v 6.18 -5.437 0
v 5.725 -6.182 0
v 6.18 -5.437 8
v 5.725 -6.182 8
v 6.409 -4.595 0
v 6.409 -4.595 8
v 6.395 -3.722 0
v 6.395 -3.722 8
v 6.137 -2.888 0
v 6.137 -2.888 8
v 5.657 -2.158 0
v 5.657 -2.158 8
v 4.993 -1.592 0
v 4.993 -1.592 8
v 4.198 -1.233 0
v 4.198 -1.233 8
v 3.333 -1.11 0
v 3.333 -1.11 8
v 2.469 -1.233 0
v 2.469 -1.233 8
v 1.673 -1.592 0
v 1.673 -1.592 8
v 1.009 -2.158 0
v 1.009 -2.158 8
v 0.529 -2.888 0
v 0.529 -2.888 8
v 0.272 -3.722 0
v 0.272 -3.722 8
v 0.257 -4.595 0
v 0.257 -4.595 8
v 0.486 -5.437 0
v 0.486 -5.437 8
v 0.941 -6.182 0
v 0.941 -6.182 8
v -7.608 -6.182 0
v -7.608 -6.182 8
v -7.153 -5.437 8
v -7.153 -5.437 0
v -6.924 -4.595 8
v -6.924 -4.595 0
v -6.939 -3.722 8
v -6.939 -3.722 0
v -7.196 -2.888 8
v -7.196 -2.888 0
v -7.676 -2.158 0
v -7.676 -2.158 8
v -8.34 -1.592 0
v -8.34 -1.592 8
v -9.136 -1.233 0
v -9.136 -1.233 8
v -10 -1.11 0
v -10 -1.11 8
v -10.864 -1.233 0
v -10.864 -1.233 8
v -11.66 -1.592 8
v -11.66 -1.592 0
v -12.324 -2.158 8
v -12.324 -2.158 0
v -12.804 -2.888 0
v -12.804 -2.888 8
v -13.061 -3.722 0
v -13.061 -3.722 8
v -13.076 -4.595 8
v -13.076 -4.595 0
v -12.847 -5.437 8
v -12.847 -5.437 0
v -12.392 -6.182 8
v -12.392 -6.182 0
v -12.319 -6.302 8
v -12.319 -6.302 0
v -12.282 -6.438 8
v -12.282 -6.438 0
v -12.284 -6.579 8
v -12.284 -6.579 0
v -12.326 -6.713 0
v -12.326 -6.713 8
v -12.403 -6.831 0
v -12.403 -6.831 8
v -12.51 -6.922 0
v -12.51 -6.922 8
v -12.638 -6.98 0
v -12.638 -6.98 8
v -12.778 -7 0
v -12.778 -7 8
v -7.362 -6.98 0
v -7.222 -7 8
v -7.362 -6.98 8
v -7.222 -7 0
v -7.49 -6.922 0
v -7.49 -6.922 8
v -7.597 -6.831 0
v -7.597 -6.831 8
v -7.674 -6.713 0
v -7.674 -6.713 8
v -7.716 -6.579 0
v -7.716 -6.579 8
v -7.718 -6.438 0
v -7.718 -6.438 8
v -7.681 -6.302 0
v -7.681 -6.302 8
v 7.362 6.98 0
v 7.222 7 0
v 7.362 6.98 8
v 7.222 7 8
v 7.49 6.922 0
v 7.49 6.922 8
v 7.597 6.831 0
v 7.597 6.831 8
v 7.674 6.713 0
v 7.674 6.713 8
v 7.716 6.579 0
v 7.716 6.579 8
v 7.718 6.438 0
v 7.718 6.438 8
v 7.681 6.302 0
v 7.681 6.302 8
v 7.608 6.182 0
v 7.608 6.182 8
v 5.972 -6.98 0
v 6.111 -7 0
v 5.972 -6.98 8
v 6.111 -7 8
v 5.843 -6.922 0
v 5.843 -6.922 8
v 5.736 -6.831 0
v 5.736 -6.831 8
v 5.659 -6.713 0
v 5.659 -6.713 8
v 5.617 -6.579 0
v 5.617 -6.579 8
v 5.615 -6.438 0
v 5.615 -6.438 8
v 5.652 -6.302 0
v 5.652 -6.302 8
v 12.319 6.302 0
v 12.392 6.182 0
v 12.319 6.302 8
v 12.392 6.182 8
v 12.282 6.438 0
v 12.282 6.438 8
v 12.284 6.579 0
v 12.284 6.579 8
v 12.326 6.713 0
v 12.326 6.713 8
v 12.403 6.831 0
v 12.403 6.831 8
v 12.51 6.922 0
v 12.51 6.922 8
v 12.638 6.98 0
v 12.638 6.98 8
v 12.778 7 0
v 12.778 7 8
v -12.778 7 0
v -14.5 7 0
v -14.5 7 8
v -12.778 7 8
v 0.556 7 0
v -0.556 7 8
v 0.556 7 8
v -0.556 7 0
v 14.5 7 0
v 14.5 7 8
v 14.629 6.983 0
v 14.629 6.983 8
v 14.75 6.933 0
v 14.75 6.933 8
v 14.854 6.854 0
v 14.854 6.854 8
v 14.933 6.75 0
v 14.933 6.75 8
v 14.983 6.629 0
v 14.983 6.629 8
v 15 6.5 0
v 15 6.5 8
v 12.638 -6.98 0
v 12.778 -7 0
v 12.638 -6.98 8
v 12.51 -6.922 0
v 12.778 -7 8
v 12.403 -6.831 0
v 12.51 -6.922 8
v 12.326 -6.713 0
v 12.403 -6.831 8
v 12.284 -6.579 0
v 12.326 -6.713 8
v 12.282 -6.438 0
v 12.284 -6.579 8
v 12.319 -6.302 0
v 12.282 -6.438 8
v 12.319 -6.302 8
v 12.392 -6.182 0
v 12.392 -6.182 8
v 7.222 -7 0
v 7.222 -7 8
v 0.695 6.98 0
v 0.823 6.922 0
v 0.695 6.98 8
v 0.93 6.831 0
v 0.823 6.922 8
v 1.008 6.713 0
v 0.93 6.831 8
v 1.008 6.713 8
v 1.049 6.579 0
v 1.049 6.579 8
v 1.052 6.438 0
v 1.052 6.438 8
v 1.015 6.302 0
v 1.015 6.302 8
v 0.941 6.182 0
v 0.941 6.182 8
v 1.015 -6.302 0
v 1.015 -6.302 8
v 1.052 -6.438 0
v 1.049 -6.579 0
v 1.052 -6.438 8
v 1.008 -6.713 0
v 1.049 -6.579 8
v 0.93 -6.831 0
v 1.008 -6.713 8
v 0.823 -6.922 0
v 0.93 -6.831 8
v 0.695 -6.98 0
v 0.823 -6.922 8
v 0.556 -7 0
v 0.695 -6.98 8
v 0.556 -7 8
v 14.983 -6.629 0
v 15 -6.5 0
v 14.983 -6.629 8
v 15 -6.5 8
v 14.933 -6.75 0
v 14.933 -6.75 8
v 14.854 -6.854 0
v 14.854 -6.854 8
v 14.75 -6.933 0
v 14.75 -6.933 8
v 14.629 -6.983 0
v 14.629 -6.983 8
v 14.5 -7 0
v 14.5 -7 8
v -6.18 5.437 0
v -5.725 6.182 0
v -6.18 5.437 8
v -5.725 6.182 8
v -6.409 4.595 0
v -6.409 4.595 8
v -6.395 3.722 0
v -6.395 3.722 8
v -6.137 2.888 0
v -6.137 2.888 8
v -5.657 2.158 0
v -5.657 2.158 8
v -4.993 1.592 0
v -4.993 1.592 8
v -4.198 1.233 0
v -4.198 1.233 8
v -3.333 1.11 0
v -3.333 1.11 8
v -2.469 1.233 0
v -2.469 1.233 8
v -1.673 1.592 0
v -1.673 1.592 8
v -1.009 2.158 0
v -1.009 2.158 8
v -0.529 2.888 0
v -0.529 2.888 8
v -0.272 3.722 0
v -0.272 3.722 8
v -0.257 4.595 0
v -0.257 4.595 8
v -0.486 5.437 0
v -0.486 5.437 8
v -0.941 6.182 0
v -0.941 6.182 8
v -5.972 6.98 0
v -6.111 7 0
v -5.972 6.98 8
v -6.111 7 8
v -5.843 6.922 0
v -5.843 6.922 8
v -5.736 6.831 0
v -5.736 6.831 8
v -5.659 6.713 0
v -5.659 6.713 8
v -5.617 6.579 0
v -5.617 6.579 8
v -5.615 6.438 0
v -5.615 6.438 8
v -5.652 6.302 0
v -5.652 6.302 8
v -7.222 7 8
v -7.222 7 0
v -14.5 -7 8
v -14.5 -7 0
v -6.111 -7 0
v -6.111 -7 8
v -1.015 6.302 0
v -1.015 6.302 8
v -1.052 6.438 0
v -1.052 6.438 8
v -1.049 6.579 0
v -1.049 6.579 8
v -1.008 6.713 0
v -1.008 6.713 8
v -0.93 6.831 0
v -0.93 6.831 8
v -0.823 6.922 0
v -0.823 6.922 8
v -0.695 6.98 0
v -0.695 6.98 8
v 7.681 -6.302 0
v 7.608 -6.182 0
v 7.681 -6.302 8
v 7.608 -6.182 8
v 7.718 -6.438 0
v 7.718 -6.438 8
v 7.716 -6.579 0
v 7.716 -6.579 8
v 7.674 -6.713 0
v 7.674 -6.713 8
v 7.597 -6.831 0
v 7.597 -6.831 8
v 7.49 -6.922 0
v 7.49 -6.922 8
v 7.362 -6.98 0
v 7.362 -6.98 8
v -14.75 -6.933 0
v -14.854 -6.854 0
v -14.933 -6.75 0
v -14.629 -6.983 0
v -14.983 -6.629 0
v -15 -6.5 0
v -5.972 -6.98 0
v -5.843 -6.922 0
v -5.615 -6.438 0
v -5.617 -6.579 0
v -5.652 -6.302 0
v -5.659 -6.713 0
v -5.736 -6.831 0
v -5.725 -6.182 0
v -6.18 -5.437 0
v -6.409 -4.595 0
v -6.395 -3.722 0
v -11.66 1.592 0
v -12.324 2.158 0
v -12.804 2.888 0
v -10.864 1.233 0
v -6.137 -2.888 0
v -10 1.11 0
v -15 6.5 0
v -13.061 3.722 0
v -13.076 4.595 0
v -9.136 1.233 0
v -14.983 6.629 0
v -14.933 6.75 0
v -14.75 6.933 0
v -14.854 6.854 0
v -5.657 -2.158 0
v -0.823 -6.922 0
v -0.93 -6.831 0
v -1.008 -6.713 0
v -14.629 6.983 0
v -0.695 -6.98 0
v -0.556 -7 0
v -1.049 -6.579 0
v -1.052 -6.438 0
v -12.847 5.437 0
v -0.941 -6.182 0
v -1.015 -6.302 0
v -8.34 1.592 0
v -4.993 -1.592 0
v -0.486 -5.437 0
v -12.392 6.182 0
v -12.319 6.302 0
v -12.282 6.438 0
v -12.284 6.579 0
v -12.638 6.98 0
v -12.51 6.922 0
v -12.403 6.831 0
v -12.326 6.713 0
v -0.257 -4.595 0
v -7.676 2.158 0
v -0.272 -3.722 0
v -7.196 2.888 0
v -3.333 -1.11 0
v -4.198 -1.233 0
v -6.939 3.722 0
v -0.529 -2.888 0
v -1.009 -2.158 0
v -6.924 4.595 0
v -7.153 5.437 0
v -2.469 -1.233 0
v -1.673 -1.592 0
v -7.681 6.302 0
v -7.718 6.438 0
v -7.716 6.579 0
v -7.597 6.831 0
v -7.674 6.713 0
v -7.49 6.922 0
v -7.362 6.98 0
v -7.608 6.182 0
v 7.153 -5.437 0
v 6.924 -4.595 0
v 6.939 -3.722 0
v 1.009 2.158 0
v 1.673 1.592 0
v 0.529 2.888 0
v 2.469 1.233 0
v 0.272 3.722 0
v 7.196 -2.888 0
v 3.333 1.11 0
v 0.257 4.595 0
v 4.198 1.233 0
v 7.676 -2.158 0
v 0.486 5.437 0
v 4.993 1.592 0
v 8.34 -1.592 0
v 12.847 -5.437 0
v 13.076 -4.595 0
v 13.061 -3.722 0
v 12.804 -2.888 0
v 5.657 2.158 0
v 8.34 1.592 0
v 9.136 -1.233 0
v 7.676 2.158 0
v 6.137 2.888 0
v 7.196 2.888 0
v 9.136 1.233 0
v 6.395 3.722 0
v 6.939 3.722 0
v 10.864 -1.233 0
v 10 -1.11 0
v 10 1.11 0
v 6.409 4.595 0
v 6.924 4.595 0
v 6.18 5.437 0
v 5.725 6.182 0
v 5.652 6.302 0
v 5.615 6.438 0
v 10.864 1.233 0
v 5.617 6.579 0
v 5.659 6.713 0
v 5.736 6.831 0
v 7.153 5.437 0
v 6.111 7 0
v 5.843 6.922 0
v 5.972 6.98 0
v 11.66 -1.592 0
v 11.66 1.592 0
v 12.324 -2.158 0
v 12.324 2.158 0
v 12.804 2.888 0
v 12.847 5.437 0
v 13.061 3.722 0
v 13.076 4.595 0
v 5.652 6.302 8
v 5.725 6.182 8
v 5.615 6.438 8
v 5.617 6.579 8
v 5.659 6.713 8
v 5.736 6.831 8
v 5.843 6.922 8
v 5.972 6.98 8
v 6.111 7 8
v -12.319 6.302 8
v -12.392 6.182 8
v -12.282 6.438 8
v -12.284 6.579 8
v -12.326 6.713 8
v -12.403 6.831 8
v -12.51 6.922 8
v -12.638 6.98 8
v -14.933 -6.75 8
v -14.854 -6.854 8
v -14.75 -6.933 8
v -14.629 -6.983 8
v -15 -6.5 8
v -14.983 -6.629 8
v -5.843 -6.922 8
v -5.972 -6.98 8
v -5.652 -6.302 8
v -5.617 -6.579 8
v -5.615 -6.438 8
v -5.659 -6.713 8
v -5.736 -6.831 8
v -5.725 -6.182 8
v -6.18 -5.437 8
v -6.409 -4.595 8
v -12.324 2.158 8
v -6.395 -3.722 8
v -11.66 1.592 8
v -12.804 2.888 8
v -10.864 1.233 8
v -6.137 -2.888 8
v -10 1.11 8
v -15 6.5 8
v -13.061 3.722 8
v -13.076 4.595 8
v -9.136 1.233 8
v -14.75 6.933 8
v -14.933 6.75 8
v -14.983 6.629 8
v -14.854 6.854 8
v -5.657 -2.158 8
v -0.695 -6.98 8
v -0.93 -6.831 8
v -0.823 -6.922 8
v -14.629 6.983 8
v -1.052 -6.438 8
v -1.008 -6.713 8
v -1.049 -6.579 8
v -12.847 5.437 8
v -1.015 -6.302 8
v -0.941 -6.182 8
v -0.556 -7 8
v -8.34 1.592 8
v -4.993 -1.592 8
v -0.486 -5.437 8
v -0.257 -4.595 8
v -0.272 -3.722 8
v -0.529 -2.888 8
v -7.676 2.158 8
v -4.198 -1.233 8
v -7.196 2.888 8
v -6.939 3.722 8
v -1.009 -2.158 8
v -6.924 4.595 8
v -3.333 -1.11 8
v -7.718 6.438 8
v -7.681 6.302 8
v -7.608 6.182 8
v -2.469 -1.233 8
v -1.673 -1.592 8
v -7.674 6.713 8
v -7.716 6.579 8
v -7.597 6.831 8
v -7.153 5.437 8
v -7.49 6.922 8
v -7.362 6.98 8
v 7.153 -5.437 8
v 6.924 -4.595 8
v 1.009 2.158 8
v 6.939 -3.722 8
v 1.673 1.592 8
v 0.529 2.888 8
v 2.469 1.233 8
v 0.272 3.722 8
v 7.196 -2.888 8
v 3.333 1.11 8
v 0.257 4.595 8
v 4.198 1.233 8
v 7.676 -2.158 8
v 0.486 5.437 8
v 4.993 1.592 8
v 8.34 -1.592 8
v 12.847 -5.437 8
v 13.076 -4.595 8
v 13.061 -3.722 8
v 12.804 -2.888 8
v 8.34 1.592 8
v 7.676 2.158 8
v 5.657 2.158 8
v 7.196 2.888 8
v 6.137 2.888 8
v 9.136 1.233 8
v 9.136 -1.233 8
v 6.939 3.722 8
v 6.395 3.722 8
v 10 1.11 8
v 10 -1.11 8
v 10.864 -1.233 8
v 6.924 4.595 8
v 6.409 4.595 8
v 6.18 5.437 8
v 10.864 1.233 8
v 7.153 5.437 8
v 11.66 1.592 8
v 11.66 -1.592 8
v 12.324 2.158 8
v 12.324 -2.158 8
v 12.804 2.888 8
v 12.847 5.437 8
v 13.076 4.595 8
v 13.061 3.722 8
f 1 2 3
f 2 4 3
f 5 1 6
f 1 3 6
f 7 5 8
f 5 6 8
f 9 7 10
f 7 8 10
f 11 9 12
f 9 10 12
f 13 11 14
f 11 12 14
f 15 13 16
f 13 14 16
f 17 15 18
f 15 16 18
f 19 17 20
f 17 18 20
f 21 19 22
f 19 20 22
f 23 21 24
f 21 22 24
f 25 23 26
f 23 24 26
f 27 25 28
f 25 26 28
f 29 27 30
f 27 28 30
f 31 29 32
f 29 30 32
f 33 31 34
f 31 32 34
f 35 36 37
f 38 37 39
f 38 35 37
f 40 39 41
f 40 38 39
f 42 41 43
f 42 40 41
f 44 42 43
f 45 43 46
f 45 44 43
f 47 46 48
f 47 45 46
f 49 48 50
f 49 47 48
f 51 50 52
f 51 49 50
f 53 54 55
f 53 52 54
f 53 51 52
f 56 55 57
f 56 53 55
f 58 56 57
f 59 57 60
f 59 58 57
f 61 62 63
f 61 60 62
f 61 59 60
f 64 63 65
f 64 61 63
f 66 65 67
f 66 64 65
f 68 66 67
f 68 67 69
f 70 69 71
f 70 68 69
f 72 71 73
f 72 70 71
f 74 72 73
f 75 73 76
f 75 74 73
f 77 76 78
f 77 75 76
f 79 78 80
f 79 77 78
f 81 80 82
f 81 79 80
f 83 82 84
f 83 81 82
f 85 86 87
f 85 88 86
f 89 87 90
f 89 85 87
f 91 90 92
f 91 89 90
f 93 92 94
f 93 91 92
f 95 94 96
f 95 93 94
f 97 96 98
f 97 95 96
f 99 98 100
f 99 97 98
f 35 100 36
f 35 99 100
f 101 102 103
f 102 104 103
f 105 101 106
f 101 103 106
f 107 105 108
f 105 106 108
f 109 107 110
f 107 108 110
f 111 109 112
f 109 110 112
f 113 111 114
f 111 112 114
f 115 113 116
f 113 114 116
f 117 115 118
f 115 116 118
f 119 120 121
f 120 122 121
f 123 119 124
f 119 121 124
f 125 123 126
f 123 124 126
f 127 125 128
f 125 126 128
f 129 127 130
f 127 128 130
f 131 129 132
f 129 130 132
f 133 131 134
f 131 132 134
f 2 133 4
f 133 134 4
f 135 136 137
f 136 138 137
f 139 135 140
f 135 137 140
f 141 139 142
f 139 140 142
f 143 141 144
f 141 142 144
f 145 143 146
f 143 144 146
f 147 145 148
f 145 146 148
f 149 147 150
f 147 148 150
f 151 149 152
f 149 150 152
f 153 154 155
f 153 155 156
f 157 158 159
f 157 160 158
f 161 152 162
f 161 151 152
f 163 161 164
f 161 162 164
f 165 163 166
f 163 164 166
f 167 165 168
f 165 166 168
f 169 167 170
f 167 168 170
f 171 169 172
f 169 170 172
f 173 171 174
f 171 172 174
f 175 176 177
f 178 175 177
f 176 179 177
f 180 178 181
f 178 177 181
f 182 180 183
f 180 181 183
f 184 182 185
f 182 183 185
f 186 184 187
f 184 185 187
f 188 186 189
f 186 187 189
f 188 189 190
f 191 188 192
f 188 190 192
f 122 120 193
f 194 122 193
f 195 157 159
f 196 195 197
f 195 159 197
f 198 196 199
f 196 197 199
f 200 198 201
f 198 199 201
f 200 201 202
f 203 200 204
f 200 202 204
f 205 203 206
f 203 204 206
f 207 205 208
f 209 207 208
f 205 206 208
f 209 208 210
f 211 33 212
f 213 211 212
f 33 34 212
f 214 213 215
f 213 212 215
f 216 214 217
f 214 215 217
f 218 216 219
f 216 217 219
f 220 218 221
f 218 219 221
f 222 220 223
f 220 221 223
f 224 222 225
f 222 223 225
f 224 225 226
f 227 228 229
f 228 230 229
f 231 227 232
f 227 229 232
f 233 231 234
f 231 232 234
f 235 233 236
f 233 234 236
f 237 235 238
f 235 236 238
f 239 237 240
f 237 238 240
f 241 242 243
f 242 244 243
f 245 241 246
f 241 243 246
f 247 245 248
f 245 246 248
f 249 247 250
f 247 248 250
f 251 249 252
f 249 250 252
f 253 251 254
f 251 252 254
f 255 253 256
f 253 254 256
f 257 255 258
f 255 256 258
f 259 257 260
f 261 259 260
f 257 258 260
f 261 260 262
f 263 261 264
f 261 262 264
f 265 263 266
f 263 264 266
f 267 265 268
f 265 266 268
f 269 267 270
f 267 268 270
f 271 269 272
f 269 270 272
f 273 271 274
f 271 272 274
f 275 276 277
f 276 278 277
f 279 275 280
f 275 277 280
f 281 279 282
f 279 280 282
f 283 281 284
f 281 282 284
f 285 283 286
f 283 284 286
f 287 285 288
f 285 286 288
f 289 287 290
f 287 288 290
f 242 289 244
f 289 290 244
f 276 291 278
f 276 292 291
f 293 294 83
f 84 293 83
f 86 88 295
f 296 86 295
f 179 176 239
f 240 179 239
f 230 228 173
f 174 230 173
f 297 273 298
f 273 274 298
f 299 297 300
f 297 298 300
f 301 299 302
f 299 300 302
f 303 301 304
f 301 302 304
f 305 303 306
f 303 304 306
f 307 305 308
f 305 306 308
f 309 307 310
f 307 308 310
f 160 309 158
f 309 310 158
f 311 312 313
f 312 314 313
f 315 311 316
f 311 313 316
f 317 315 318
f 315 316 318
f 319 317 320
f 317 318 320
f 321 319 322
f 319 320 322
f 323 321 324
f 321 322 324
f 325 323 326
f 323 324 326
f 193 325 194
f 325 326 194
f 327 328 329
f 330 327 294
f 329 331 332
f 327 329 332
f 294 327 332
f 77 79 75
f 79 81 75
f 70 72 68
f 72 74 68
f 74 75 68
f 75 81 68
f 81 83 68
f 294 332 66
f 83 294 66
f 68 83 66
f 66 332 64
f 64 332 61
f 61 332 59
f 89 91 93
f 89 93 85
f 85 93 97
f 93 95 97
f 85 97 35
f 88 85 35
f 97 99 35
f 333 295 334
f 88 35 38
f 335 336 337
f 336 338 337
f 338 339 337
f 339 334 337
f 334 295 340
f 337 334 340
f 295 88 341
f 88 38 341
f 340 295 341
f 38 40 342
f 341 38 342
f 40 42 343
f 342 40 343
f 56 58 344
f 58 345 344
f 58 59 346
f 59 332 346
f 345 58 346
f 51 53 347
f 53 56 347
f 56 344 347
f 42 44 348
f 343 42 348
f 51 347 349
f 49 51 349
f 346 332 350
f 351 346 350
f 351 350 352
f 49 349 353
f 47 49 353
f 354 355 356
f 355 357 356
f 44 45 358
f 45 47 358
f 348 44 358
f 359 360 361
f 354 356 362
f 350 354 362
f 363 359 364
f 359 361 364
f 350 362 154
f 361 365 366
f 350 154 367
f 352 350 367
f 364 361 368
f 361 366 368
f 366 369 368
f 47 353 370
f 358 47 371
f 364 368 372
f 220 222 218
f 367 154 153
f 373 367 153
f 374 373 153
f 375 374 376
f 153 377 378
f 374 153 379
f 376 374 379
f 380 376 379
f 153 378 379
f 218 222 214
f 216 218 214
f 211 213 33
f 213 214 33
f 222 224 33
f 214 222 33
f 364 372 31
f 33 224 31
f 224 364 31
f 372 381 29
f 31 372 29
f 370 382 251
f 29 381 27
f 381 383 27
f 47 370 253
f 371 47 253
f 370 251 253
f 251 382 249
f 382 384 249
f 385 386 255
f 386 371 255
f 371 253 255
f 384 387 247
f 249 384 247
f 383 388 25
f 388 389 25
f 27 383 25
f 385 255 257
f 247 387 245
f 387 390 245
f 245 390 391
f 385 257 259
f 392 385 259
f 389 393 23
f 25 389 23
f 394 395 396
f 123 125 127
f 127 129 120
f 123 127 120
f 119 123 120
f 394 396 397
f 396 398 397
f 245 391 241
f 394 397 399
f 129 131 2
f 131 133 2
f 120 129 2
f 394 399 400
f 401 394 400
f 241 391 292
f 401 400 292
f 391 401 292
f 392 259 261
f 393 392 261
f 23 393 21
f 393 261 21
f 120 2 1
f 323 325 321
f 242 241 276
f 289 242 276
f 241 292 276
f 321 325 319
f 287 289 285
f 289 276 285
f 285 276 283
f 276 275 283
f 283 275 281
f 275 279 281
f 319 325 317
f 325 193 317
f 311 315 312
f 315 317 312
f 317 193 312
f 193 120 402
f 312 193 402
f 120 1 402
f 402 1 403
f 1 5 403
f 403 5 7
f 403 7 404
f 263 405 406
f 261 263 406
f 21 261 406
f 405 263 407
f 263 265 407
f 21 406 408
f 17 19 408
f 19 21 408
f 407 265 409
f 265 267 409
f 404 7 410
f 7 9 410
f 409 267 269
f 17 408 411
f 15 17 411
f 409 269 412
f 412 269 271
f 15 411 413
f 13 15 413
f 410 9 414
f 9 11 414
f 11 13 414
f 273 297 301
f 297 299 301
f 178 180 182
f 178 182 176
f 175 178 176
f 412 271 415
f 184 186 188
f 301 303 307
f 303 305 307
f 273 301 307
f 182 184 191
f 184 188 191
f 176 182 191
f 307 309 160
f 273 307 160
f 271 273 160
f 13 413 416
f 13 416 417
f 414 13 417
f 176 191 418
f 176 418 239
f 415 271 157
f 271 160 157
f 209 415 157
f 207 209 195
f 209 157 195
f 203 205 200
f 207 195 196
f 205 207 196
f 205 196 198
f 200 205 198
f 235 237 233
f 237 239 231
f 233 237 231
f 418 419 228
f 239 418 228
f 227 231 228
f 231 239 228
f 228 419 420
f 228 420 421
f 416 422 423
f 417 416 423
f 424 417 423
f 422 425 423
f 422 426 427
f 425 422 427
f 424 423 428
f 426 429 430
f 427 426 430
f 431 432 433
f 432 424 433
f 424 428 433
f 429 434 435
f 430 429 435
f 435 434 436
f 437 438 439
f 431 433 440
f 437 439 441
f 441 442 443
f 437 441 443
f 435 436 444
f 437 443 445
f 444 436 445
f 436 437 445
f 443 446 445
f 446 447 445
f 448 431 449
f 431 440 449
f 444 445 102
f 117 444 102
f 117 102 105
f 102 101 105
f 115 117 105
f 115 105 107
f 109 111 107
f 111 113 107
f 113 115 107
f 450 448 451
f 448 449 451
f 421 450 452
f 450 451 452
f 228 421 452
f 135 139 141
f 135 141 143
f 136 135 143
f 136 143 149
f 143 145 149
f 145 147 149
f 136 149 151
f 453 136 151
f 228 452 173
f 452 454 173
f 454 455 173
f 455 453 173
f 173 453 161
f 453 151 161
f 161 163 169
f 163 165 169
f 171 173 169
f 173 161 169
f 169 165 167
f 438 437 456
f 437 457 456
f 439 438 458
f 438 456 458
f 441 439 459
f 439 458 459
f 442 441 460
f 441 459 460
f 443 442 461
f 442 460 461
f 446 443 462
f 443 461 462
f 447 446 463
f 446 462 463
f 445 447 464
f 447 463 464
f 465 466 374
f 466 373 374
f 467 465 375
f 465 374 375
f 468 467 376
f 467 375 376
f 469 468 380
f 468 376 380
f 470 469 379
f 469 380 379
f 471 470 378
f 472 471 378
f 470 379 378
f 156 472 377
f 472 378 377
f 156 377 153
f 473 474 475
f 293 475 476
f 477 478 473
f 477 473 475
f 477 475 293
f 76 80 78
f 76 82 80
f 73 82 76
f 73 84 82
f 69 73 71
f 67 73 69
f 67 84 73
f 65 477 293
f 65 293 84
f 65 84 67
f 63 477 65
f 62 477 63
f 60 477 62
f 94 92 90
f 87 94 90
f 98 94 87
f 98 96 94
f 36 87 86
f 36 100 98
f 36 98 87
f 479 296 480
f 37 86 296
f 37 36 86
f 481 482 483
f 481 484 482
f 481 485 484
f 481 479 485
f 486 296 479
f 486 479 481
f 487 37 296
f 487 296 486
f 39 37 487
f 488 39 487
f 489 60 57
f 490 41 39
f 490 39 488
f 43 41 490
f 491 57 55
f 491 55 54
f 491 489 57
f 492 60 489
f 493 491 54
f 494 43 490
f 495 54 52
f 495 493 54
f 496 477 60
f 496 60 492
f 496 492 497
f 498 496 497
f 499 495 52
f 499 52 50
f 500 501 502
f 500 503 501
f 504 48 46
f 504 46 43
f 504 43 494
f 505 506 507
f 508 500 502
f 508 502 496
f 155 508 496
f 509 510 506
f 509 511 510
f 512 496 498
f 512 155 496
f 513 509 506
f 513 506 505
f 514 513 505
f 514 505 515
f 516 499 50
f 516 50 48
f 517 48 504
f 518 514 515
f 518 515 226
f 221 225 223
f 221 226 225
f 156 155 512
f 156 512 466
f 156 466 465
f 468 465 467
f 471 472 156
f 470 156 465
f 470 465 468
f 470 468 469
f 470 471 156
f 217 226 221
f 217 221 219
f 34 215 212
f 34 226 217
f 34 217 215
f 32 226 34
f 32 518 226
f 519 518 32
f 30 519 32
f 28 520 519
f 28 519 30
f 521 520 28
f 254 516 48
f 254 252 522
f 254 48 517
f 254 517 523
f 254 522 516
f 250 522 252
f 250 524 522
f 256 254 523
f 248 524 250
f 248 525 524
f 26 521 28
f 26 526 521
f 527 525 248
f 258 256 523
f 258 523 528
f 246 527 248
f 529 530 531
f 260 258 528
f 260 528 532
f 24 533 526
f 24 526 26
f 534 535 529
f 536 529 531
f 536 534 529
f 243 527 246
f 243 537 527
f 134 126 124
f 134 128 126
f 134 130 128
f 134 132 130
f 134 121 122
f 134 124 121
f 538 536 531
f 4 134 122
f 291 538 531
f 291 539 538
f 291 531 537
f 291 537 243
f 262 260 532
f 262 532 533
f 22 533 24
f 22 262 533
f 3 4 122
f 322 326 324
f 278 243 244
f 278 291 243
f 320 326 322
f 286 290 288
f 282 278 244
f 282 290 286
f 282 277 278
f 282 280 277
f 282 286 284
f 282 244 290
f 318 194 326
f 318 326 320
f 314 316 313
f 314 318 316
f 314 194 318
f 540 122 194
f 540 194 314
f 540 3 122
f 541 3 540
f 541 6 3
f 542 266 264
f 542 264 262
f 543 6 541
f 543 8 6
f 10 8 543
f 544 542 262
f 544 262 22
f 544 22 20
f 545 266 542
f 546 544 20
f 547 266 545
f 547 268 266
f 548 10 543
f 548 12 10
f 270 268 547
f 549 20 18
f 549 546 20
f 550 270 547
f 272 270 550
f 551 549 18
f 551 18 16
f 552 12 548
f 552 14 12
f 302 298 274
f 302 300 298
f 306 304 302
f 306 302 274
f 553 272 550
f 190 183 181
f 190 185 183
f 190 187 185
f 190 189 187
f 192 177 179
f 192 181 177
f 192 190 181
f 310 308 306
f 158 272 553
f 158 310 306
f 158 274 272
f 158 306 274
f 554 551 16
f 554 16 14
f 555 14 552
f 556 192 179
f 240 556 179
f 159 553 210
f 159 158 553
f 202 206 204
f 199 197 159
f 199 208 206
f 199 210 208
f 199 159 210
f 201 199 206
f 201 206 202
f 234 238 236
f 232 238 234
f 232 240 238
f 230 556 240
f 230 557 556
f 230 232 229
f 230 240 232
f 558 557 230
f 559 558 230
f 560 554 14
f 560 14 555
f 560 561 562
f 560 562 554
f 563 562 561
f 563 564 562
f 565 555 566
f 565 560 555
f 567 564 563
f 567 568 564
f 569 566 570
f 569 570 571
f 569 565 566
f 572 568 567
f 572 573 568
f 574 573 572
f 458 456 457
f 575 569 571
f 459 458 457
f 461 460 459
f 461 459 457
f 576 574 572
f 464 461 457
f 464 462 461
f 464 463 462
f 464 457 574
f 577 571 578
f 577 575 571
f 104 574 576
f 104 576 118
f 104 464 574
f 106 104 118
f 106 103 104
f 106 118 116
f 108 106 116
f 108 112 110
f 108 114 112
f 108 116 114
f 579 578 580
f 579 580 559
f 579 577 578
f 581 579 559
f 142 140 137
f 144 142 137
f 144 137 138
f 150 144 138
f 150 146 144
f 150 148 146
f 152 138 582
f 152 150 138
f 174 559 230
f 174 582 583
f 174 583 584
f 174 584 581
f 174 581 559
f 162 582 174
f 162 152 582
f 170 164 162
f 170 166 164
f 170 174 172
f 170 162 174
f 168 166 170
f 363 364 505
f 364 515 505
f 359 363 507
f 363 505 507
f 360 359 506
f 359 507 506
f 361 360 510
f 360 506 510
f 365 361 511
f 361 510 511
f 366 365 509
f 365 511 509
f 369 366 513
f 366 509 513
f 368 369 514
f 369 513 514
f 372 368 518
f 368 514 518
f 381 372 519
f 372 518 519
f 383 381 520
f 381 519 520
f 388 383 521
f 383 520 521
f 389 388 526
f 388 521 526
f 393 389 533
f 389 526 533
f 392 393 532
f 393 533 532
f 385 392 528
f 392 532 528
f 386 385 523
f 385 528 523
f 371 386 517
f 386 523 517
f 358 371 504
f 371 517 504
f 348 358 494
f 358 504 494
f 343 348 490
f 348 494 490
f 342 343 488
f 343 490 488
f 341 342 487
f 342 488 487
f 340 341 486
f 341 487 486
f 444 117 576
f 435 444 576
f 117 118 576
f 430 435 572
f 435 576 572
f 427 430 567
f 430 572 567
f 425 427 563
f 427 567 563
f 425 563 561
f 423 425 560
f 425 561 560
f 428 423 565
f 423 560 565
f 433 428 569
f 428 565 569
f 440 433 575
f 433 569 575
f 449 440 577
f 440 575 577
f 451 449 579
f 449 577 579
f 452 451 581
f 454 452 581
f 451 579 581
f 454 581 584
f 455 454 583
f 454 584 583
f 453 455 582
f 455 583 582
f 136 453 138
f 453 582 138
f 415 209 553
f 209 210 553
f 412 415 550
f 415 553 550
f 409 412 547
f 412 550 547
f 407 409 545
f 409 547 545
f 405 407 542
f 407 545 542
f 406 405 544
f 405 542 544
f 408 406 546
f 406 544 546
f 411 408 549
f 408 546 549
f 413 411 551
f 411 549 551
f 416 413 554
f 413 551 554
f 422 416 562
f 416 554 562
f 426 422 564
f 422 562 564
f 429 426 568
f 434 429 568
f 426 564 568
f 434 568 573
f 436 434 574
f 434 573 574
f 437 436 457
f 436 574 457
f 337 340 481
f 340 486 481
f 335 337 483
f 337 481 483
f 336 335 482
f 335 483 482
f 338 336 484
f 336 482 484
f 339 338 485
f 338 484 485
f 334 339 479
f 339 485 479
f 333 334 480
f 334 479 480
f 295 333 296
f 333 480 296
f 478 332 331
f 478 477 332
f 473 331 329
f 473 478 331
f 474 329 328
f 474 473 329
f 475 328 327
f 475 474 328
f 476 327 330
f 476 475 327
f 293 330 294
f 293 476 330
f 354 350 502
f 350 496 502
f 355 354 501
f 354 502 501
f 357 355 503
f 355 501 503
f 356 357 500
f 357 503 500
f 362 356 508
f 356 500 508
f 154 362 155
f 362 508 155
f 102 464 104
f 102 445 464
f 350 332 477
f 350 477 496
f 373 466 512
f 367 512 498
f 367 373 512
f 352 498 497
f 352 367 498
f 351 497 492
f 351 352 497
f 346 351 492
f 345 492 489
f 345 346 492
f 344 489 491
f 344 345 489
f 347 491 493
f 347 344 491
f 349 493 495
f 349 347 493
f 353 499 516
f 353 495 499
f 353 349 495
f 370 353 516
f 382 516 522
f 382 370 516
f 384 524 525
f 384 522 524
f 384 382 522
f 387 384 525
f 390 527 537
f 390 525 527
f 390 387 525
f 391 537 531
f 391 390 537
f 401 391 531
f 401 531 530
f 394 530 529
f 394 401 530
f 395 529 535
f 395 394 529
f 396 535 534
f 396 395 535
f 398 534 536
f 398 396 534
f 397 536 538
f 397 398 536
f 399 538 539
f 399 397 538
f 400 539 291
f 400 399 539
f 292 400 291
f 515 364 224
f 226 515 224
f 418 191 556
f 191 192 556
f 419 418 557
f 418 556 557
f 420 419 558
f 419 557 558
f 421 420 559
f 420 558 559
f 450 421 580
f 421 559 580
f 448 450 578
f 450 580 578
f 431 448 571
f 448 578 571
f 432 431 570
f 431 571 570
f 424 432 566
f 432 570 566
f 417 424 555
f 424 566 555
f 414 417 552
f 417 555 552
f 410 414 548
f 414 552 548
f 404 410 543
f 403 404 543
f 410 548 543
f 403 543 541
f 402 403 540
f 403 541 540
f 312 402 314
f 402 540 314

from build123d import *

# Parameters (mm, degrees)
SKETCH006_W            = 30
SKETCH006_H            = 14
PAD003_DEPTH           = 8
SKETCH007_R            = 3.1
POCKET003_DEPTH        = 0.001
POCKET003_DEPTH_BACK   = 8.001
LINEARPATTERN003_COUNT = 4
LINEARPATTERN003_PITCH = 6.666667
PARTDESIGN_FILLET003_R = 0.5


with BuildPart() as part:
    # Sketch006 → Pad003 (new body)
    with BuildSketch(Plane.XY):
        Rectangle(SKETCH006_W, SKETCH006_H)
    extrude(amount=PAD003_DEPTH)

    # Sketch007 → Pocket003 (cut, two sides)
    with BuildSketch(Plane.XY) as pocket003_sk:
        with Locations((-10, 4.21)):
            Circle(SKETCH007_R)
        with Locations((-10, -4.21)):
            Circle(SKETCH007_R)
    pocket003 = extrude(amount=-POCKET003_DEPTH, mode=Mode.SUBTRACT) + extrude(pocket003_sk.sketch, amount=POCKET003_DEPTH_BACK, mode=Mode.SUBTRACT)

    # LinearPattern003: Pocket003 ×4
    with Locations(*[(i * LINEARPATTERN003_PITCH, 0, 0) for i in range(1, LINEARPATTERN003_COUNT)]):
        add(pocket003, mode=Mode.SUBTRACT)

    # PartDesign__Fillet003
    partdesign_fillet003_edges = [part.edges().sort_by_distance(p)[0] for p in [
        (-15, -7, 4),
        (-15, 7, 4),
        (-11.351259, -7, 4),
        (-11.351259, 7, 4),
        (-6.9, -4.21, 4),
        (-6.9, 4.21, 4),
        (-8.648741, 7, 4),
        (-4.684592, 7, 4),
        (-0.233333, 4.21, 4),
        (-1.982075, 7, 4),
        (1.982075, 7, 4),
        (6.433333, 4.21, 4),
        (4.684592, 7, 4),
        (8.648741, 7, 4),
        (13.1, 4.21, 4),
        (11.351259, 7, 4),
        (15, 7, 4),
        (15, -7, 4),
        (11.351259, -7, 4),
        (13.1, -4.21, 4),
        (8.648741, -7, 4),
        (4.684592, -7, 4),
        (6.433333, -4.21, 4),
        (1.982075, -7, 4),
        (-1.982075, -7, 4),
        (-0.233333, -4.21, 4),
        (-4.684592, -7, 4),
        (-8.648741, -7, 4),
    ]]
    fillet(partdesign_fillet003_edges, radius=PARTDESIGN_FILLET003_R)


solid = part.part
